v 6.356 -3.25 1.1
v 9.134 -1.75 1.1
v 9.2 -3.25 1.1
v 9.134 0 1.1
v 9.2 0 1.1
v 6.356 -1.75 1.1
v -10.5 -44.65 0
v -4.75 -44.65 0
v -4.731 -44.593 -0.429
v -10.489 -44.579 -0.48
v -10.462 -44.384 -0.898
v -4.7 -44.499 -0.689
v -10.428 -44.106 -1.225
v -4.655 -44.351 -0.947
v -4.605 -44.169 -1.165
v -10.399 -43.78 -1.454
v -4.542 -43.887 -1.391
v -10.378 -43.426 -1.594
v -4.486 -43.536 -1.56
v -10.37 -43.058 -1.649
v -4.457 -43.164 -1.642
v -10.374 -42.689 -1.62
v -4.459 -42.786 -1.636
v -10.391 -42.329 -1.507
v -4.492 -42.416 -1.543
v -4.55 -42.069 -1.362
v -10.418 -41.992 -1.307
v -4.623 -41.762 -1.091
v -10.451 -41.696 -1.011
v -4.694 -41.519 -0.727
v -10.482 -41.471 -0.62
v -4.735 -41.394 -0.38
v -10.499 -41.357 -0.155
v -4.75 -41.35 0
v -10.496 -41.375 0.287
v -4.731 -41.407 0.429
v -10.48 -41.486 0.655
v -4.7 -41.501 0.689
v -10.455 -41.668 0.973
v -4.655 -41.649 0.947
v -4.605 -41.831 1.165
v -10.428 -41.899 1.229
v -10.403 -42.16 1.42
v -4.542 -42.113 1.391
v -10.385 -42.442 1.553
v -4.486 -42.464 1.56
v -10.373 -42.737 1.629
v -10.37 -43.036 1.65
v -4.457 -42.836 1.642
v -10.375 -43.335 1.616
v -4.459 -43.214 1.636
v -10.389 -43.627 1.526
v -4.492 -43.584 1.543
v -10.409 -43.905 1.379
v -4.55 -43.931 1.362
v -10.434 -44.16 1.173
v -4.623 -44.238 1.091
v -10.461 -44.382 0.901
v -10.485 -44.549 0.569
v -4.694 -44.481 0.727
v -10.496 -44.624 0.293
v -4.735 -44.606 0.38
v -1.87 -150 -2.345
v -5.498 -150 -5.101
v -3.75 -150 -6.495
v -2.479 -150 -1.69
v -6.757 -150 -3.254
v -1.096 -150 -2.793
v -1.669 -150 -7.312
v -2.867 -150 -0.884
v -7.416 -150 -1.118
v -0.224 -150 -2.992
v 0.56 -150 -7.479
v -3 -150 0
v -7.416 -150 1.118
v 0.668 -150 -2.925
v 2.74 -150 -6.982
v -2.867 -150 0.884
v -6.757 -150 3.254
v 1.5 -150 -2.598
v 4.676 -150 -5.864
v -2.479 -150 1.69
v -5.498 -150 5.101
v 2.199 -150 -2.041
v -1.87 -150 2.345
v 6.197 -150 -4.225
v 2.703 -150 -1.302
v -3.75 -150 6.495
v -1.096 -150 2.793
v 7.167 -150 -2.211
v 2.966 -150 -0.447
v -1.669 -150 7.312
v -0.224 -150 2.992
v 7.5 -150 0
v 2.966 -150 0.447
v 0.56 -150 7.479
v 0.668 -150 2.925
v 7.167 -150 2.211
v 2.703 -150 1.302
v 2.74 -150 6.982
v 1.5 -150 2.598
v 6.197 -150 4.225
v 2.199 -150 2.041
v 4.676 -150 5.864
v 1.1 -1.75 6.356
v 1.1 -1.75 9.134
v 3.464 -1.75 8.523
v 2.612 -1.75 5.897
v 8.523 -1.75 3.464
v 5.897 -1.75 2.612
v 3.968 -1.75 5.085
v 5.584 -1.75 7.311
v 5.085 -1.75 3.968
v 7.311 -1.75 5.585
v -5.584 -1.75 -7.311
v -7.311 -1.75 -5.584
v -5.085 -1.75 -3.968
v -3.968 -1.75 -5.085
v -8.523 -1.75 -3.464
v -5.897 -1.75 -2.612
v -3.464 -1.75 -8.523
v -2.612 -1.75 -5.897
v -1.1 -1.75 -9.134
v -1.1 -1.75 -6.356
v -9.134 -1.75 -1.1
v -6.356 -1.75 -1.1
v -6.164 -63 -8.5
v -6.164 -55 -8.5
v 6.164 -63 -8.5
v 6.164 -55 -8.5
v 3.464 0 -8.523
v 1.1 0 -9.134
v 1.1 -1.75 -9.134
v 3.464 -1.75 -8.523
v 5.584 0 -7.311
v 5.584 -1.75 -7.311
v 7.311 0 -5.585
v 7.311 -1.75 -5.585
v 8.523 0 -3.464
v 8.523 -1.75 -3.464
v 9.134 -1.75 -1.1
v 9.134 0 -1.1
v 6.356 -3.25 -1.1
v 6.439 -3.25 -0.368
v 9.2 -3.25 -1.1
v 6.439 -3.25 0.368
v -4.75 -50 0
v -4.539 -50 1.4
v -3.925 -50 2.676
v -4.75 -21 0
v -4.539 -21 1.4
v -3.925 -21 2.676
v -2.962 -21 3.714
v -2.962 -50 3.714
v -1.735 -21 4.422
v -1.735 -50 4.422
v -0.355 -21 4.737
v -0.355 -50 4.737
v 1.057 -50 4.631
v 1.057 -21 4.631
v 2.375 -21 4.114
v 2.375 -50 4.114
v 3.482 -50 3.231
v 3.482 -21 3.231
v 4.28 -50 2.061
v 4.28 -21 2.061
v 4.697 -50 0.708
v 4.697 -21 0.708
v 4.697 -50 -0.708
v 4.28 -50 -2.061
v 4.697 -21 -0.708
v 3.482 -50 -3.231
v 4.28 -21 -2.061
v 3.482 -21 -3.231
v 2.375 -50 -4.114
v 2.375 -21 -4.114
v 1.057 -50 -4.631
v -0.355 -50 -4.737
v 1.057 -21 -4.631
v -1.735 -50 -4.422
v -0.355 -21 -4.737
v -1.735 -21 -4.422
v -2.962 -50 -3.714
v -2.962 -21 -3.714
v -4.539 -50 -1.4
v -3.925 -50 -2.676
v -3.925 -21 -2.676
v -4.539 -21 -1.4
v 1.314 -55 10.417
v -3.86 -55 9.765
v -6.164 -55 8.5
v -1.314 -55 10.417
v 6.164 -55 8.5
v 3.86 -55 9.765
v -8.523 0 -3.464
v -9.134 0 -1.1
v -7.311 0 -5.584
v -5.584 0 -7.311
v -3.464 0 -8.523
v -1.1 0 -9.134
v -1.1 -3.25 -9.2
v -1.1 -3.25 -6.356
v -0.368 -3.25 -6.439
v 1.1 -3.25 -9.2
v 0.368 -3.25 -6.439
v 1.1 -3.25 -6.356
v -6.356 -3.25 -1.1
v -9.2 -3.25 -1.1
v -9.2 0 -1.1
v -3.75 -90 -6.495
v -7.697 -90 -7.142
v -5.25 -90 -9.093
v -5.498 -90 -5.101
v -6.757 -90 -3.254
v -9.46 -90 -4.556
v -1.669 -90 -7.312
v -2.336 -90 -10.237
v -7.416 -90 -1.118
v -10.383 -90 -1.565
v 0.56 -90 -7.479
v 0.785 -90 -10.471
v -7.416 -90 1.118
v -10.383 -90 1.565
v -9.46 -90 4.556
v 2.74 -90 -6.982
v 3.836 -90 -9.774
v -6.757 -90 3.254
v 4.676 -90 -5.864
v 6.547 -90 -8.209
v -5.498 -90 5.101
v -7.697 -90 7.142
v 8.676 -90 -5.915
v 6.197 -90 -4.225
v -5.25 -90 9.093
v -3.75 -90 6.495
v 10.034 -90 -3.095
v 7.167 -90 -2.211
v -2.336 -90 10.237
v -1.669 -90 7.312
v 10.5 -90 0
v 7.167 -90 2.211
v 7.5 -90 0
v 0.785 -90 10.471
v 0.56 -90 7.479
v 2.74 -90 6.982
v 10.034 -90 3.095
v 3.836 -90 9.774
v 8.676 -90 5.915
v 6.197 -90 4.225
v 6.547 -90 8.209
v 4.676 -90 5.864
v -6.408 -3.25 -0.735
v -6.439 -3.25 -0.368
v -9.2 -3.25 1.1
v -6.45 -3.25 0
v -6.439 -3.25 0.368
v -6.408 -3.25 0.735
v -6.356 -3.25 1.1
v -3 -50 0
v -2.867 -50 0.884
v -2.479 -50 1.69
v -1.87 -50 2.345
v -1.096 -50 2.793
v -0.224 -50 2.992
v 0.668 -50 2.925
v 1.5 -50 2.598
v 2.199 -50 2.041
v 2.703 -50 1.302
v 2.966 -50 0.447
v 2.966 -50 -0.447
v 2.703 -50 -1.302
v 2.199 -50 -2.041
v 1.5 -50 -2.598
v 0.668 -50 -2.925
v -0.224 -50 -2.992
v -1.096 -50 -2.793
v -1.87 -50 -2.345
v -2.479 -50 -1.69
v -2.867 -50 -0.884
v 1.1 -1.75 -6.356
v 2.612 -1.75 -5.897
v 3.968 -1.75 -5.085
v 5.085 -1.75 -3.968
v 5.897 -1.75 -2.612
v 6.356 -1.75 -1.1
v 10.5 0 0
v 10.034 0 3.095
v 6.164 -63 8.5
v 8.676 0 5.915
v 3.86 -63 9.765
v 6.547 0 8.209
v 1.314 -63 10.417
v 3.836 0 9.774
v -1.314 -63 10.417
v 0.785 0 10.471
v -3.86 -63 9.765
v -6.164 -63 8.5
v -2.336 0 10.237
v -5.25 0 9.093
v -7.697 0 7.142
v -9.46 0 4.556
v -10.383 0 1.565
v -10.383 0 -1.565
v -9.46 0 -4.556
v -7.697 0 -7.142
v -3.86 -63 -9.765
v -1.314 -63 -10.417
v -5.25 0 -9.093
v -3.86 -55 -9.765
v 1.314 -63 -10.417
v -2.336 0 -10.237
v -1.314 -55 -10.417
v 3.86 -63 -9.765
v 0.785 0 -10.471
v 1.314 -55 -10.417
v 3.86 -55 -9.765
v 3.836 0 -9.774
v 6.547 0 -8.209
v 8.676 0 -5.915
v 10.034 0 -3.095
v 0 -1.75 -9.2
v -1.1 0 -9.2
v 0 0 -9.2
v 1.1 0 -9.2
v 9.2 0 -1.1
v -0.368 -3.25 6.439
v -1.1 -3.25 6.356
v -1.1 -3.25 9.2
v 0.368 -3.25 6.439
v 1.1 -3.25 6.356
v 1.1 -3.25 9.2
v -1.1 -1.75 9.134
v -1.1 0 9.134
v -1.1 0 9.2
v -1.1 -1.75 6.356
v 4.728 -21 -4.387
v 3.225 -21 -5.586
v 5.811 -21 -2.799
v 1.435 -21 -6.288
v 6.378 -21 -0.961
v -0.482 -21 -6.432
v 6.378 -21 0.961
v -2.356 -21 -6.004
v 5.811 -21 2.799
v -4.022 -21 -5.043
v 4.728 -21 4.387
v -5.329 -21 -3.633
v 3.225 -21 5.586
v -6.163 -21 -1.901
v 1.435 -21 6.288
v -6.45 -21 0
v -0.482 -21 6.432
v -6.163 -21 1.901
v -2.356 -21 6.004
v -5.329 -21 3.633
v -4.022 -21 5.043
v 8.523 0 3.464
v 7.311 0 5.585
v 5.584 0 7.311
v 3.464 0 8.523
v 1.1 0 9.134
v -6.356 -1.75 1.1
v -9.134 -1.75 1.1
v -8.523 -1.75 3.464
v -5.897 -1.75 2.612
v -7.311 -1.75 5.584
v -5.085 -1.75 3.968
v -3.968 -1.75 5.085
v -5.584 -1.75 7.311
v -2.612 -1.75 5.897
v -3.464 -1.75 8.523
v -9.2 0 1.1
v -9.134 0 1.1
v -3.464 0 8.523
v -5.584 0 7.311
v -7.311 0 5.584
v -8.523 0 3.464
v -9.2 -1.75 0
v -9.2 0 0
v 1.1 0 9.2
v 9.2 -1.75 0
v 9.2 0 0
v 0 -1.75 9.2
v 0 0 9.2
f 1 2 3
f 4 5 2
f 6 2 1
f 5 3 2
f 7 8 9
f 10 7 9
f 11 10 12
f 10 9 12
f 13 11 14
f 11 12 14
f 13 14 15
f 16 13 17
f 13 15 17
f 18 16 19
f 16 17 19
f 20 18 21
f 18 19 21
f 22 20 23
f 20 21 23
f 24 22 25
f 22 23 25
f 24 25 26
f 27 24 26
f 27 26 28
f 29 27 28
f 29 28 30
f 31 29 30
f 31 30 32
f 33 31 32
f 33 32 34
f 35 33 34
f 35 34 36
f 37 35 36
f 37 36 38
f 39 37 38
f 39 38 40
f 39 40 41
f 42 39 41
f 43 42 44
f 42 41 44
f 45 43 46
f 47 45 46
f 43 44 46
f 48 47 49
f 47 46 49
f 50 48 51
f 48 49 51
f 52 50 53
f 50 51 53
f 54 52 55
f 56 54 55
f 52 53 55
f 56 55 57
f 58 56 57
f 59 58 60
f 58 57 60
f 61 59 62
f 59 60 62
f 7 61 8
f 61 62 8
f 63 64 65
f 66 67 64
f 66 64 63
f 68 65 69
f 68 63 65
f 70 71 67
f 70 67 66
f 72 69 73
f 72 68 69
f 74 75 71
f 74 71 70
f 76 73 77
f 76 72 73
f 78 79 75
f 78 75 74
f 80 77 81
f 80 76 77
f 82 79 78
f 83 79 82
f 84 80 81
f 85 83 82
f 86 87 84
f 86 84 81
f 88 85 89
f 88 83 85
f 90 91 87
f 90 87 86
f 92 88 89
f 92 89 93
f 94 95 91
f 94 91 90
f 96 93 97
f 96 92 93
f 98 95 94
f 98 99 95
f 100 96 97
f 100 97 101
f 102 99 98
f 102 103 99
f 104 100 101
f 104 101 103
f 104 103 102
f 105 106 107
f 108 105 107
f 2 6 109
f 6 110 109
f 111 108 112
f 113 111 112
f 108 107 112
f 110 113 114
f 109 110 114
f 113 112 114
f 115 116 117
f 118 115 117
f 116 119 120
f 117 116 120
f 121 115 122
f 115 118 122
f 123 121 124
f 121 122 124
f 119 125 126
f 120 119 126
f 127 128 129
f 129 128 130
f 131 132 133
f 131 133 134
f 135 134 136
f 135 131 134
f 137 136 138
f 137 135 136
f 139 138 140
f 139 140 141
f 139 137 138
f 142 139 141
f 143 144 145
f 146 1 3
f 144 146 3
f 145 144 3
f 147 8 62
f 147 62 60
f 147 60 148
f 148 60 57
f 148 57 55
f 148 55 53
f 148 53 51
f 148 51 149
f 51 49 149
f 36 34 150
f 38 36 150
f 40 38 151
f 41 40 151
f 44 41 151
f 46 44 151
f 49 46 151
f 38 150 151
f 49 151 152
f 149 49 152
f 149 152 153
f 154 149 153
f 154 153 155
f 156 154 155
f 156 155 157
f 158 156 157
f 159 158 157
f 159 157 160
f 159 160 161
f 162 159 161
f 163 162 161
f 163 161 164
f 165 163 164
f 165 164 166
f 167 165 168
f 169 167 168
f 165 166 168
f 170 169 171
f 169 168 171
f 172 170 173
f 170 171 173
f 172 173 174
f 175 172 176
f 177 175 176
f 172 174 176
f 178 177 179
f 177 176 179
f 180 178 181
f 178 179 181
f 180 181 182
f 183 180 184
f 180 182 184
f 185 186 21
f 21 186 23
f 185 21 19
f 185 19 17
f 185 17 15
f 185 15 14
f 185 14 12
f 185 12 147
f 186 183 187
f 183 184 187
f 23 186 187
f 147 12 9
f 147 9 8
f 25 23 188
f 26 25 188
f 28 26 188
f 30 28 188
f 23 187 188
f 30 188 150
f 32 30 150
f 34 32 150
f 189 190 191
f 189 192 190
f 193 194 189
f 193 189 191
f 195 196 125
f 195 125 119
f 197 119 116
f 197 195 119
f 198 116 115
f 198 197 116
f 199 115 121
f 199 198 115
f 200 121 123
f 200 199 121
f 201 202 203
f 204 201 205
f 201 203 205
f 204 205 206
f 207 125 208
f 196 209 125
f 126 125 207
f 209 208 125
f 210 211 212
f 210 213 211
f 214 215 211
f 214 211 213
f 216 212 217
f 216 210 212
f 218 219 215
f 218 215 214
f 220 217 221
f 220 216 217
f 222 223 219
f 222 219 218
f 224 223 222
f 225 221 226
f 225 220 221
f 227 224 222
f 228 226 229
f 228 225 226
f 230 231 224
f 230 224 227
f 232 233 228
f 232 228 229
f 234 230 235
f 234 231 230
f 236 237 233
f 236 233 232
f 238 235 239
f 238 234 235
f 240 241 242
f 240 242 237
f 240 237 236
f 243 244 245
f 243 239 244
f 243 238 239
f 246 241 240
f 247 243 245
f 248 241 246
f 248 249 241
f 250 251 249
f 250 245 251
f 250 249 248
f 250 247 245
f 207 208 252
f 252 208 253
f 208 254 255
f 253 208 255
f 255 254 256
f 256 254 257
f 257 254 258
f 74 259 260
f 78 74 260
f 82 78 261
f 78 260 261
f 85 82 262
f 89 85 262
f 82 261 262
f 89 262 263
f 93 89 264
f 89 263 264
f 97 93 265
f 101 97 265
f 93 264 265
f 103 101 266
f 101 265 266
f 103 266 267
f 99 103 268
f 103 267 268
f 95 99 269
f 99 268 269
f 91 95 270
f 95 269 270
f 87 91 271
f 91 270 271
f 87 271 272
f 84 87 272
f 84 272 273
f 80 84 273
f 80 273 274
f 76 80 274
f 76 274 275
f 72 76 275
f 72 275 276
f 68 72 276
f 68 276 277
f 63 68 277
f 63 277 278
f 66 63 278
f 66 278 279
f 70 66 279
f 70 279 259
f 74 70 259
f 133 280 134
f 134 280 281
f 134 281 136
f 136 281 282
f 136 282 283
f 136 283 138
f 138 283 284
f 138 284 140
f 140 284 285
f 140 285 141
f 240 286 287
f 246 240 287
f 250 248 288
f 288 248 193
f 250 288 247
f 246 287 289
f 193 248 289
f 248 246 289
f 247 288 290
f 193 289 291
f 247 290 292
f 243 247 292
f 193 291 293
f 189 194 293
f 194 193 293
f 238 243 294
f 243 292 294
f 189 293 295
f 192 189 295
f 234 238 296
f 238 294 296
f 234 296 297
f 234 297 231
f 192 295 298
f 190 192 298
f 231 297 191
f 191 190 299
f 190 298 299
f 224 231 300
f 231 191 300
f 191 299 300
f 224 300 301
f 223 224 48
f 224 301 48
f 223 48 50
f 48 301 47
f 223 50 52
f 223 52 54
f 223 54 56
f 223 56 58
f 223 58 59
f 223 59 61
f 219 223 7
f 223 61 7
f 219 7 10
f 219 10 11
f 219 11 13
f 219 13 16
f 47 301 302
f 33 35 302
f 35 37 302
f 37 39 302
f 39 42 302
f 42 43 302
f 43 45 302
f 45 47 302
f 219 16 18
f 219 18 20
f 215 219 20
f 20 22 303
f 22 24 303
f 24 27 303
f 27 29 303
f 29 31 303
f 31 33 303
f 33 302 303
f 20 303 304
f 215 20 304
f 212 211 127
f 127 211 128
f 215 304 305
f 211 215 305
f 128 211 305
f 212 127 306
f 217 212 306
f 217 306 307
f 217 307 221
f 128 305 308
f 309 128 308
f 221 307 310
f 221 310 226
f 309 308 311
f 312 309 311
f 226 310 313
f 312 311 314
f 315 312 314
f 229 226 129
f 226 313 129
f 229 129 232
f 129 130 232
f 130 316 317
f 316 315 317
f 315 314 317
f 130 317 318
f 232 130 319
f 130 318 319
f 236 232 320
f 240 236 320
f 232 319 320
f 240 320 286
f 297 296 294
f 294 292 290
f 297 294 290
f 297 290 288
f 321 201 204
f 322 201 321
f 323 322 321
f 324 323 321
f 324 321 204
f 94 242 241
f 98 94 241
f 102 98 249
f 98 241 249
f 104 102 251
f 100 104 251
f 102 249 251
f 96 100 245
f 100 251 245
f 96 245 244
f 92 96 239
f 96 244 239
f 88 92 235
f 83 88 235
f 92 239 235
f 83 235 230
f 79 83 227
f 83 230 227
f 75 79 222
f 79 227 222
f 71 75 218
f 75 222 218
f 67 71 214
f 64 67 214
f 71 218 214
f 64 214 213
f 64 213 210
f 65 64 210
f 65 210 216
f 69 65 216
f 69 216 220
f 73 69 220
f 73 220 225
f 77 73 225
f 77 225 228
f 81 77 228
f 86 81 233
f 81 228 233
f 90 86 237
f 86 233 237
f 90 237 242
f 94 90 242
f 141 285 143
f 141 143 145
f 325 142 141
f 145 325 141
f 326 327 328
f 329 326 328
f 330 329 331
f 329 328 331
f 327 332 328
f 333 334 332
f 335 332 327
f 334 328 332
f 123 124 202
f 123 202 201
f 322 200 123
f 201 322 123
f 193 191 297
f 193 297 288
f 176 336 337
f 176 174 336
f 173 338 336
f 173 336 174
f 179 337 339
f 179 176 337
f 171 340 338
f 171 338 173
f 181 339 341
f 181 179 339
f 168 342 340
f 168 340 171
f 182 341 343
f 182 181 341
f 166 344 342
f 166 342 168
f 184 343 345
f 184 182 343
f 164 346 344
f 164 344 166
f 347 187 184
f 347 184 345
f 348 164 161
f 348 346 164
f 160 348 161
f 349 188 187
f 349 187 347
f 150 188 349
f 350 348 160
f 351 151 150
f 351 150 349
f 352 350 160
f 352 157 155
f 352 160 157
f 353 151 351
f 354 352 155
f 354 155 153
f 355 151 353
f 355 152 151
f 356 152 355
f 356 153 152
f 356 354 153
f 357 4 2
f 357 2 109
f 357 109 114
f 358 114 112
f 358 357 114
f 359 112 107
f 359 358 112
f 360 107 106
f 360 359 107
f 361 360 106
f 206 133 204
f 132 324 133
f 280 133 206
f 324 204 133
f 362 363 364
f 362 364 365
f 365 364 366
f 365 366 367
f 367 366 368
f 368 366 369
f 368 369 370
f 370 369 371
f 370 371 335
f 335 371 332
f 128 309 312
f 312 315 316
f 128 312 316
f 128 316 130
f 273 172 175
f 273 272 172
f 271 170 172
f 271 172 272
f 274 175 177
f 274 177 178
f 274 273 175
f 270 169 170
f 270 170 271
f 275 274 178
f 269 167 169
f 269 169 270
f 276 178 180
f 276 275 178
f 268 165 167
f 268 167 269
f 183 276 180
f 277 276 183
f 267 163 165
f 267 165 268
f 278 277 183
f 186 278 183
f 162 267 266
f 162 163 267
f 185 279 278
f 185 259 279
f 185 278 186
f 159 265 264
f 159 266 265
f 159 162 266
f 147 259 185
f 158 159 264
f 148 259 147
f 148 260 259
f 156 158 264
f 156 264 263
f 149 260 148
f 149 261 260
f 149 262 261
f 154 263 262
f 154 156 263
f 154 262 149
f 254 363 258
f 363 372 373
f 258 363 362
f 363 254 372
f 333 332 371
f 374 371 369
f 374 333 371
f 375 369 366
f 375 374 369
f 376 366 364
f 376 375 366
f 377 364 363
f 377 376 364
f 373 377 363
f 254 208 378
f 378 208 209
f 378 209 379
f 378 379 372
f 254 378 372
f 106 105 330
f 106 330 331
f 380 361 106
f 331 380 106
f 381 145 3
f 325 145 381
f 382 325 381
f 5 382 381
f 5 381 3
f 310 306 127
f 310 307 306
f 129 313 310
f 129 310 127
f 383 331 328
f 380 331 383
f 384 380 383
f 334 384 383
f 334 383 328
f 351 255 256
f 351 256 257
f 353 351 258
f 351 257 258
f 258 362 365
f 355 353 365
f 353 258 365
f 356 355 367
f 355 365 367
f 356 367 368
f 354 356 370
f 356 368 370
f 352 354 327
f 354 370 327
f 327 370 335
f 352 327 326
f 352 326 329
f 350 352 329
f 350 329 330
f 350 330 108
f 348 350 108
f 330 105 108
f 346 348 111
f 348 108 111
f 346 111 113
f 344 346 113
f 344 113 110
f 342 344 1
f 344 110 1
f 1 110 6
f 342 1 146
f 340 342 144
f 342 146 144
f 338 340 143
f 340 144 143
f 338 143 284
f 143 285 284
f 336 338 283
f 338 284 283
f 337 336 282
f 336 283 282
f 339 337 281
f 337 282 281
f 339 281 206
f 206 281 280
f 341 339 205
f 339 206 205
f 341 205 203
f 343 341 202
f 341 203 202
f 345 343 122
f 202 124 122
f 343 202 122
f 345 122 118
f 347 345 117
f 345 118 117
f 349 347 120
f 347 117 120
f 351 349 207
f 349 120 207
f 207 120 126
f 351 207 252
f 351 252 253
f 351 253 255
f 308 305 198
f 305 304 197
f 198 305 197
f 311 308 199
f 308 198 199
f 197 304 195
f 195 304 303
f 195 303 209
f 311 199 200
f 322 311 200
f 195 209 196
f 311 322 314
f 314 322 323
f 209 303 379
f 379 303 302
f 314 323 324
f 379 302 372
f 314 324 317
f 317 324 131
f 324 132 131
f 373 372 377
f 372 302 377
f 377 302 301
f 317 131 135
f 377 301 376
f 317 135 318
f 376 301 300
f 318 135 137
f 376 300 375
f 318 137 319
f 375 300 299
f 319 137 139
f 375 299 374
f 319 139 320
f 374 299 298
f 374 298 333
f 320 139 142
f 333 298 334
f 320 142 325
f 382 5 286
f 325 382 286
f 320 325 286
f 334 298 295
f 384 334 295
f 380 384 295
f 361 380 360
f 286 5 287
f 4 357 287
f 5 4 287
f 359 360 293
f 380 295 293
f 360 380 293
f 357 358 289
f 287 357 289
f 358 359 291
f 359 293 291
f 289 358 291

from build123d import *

# Parameters (mm, degrees)
F0_R      = 10.5
F1_DEPTH  = 90
F2_R      = 7.5
F3_DEPTH  = 60
F5_D      = 6
F6_R      = 4.75
F6_R_2    = 3
F7_DEPTH  = 50
F8_R      = 6.45
F9_DEPTH  = 21
F10_R     = 9.2
F11_DEPTH = 1.75
F12_W     = 8.1
F12_H     = 2.2
F13_DEPTH = 3.25
F15_W     = 49.0491833104
F15_H     = 8
F16_DEPTH = 2
F18_W     = 39.7552206603
F18_H     = 8
F19_DEPTH = 2
F22_D     = 3.3
F22_DEPTH = 10
F22_TIP   = 0.9914200214


with BuildPart() as f1:
    # F0 (on Front) → F1 (new body)
    with BuildSketch(Plane.XZ):
        Circle(F0_R)
    extrude(amount=F1_DEPTH)

    # F2 (on face) → F3 (join)
    with BuildSketch(Plane.XZ.offset(90)):
        Circle(F2_R)
    extrude(amount=F3_DEPTH)

    # F5 (through all)
    with Locations(Plane.XZ.offset(150)):
        with Locations((0, 0)):
            Hole(F5_D / 2)

    # F6 (on face) → F7 (cut)
    with BuildSketch(Plane(origin=(0, 0, 0), x_dir=(-1, 0, 0), z_dir=(0, 1, 0))):
        Circle(F6_R)
        Circle(F6_R_2, mode=Mode.SUBTRACT)
    extrude(amount=-F7_DEPTH, mode=Mode.SUBTRACT)

    # F8 (on face) → F9 (cut)
    with BuildSketch(Plane(origin=(0, 0, 0), x_dir=(-1, 0, 0), z_dir=(0, 1, 0))):
        Circle(F8_R)
    extrude(amount=-F9_DEPTH, mode=Mode.SUBTRACT)

    # F10 (on Front) → F11 (cut)
    with BuildSketch(Plane.XZ):
        Circle(F10_R)
    extrude(amount=F11_DEPTH, mode=Mode.SUBTRACT)

    # F12 (on Front) → F13 (cut)
    with BuildSketch(Plane.XZ):
        Polygon((1.0996337654, -1.1), (1.0996337654, 0), (1.0996337654, 1.1), (0, 1.1), (-1.1, 1.1), (-1.1, -1.1), (0, -1.1), align=None)
        Polygon((1.0996337654, 1.1), (1.0996337654, 0), (1.0996337654, -1.1), (9.2, -1.1), (9.2, 1.1), align=None)
        Polygon((0, 1.1), (1.0996337654, 1.1), (1.0996337654, 9.2), (-1.1, 9.2), (-1.1, 1.1), align=None)
        Polygon((1.0996337654, -9.2), (1.0996337654, -1.1), (0, -1.1), (-1.1, -1.1), (-1.1, -9.2), align=None)
        with Locations((-5.15, 0)):
            Rectangle(F12_W, F12_H)
    extrude(amount=F13_DEPTH, mode=Mode.SUBTRACT)

    # F15 (on offset) → F16 (cut)
    with BuildSketch(Plane.XY.offset(10.5)):
        with Locations((-2.6939958334, -59)):
            Rectangle(F15_W, F15_H)
    extrude(amount=-F16_DEPTH, mode=Mode.SUBTRACT)

    # F18 (on offset) → F19 (cut)
    with BuildSketch(Plane.XY.offset(-10.5)):
        with Locations((0.5775718018, -59)):
            Rectangle(F18_W, F18_H)
    extrude(amount=F19_DEPTH, mode=Mode.SUBTRACT)

    # F22
    with Locations(Plane(origin=(-10.5, 0, 0), x_dir=(0, 1, 0), z_dir=(-1, 0, 0))):
        with Locations((-43, 0)):
            Hole(F22_D / 2, depth=F22_DEPTH)
            with Locations((0, 0, -(F22_DEPTH + F22_TIP / 2))):  # 118° drill point
                Cone(0, F22_D / 2, F22_TIP, mode=Mode.SUBTRACT)


solid = f1.part
